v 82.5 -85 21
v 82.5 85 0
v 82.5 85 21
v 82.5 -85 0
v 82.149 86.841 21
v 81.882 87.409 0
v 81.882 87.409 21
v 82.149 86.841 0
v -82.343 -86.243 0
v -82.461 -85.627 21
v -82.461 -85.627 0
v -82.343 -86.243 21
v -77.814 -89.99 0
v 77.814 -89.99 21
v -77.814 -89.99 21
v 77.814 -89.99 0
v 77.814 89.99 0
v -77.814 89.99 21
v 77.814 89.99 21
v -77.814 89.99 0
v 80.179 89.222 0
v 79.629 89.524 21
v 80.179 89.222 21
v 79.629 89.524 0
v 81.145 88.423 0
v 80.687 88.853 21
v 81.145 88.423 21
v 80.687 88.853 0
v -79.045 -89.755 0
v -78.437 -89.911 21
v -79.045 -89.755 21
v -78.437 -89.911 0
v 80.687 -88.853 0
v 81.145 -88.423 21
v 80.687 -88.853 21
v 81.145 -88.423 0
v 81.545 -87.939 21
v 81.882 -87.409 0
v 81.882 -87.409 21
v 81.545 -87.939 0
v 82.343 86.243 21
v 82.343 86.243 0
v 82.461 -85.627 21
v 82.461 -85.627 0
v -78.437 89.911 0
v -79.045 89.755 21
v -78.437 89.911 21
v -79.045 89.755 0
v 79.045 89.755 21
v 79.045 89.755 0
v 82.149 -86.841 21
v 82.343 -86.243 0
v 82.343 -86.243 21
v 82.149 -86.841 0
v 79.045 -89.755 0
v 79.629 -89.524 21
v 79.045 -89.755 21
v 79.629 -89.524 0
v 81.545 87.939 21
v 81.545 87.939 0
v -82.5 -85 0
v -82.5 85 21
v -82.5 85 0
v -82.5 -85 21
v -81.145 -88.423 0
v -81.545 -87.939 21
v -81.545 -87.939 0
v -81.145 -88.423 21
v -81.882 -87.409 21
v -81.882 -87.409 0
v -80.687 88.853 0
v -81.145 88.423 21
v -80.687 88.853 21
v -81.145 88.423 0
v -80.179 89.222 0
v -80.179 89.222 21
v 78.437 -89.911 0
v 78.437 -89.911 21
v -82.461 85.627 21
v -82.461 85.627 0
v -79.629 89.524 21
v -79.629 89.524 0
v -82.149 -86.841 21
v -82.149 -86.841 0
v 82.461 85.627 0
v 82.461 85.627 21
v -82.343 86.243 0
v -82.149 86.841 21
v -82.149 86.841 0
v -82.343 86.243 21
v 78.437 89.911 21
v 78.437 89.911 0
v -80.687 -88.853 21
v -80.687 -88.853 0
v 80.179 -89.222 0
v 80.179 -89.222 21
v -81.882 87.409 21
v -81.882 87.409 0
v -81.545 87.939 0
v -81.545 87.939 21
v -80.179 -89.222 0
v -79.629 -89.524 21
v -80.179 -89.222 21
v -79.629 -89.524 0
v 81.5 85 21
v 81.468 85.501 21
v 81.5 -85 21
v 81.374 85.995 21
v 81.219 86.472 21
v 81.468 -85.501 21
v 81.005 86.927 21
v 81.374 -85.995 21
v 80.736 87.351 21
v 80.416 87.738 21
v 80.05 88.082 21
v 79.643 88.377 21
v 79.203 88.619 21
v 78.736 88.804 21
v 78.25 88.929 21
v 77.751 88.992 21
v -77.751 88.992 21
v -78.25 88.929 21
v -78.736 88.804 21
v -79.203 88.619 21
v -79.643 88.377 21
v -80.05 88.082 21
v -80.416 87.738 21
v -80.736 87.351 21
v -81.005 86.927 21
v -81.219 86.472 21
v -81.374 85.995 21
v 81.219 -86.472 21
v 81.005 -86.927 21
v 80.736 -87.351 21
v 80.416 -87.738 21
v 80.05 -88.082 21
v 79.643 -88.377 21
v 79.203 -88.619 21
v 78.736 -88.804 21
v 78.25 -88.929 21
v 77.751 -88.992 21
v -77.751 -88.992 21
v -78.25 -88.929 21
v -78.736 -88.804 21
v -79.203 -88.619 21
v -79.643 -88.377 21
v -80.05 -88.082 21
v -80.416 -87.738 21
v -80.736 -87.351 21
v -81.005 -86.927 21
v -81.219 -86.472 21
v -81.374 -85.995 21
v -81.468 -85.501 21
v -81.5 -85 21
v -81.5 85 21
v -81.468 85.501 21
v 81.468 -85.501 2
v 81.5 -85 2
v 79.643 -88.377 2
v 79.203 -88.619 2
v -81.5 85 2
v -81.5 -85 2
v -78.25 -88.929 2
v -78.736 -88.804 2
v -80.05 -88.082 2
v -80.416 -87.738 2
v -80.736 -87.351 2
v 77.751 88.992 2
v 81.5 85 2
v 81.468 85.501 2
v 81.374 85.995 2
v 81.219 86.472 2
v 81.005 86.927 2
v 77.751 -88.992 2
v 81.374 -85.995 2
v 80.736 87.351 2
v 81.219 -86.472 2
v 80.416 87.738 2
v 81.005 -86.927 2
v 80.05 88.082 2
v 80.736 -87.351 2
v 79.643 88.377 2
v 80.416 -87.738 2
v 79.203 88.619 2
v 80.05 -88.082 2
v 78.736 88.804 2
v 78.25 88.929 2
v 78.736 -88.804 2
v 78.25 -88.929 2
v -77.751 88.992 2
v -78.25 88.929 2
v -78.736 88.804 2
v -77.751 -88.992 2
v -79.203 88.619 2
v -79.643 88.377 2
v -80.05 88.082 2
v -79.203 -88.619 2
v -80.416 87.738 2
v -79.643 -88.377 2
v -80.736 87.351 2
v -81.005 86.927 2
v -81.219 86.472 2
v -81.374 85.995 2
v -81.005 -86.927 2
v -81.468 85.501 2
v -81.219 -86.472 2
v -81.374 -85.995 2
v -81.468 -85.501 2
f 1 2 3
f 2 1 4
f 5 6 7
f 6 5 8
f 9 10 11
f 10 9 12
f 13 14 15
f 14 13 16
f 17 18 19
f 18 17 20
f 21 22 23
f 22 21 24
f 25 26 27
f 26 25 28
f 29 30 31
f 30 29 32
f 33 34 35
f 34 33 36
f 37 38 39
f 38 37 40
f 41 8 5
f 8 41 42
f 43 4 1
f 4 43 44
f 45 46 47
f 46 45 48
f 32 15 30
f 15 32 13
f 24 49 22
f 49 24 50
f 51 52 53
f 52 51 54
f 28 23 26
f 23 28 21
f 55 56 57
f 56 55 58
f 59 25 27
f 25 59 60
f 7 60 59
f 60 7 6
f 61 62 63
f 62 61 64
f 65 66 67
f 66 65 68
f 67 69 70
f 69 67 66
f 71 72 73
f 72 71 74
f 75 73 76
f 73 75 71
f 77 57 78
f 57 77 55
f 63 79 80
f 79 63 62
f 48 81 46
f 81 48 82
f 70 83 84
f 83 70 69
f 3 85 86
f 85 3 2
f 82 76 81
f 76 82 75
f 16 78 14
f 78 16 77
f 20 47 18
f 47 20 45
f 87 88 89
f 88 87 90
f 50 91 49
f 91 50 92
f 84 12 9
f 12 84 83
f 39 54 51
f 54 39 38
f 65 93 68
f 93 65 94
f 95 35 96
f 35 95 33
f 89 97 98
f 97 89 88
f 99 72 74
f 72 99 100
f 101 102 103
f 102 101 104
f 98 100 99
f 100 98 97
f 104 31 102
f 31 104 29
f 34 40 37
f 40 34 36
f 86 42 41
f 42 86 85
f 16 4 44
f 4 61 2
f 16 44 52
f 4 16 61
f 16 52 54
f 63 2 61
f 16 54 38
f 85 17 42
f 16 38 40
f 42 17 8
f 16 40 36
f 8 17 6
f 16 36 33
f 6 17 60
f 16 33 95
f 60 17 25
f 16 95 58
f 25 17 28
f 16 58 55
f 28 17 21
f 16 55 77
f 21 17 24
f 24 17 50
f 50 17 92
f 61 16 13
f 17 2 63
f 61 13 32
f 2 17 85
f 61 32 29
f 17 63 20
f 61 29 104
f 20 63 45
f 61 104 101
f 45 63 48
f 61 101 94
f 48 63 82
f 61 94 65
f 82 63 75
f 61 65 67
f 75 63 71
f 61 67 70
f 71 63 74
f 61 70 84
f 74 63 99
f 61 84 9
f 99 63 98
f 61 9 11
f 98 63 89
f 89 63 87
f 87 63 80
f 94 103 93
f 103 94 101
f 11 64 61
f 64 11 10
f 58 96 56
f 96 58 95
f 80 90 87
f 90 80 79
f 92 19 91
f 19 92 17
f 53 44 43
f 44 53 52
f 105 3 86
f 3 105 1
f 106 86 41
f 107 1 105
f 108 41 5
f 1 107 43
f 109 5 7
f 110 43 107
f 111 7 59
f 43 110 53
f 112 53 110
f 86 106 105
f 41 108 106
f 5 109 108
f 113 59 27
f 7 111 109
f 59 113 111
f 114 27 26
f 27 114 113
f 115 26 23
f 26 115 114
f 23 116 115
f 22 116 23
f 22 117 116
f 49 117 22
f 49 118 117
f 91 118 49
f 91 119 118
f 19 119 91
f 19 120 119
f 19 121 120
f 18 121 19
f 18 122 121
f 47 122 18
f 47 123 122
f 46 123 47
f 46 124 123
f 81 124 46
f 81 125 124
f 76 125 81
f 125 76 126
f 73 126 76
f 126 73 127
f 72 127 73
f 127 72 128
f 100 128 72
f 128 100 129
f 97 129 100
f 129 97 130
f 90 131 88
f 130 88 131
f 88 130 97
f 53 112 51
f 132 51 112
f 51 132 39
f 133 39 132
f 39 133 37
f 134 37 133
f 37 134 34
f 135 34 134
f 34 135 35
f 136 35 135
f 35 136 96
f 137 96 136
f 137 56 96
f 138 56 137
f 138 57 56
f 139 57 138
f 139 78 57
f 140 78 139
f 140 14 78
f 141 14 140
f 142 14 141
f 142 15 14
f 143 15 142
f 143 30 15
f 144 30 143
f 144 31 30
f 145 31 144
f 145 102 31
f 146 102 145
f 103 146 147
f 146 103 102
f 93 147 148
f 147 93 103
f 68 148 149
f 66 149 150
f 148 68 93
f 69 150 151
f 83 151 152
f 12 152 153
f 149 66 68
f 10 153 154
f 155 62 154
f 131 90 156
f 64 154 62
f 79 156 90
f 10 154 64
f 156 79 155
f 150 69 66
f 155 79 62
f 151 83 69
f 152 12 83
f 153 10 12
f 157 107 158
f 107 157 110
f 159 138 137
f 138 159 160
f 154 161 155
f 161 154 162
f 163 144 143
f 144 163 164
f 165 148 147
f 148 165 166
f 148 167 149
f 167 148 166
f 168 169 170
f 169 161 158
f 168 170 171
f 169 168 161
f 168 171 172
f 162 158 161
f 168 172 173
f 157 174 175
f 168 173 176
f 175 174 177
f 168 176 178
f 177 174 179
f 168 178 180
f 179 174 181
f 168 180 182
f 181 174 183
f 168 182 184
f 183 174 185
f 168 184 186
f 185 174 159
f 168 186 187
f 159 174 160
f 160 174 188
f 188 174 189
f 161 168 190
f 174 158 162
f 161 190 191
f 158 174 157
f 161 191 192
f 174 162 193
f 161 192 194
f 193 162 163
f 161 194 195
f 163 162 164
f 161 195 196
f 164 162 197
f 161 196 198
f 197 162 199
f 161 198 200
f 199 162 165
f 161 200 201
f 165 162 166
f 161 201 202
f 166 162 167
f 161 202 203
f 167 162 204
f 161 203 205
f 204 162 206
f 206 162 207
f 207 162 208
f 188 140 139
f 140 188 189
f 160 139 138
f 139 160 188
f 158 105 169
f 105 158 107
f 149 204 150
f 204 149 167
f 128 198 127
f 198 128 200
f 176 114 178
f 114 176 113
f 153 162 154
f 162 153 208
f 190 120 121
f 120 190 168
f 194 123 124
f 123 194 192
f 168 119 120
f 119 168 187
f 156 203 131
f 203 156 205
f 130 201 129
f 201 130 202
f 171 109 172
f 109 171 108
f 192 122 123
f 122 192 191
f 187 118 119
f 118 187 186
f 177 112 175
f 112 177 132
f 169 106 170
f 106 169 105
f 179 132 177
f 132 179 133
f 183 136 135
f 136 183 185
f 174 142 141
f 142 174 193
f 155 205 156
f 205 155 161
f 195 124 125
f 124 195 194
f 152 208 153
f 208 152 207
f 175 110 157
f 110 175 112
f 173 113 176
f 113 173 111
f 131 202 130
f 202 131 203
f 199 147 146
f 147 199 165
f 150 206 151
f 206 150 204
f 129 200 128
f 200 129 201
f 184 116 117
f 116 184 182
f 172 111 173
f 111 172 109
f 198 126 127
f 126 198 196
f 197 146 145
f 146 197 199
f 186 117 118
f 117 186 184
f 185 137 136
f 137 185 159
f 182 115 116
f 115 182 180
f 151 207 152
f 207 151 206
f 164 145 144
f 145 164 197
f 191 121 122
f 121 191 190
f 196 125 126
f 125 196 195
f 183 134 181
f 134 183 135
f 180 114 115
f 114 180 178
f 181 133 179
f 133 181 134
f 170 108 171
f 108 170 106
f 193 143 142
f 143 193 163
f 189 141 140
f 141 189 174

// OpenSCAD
$fn = 50;


difference() {
	union() {
		hull() {
			translate(v = [-77.5000000000, 85.0000000000, 0]) {
				cylinder(h = 21, r = 5);
			}
			translate(v = [77.5000000000, 85.0000000000, 0]) {
				cylinder(h = 21, r = 5);
			}
			translate(v = [-77.5000000000, -85.0000000000, 0]) {
				cylinder(h = 21, r = 5);
			}
			translate(v = [77.5000000000, -85.0000000000, 0]) {
				cylinder(h = 21, r = 5);
			}
		}
	}
	union() {
		translate(v = [0, 0, 2]) {
			hull() {
				translate(v = [-77.5000000000, 85.0000000000, 0]) {
					cylinder(h = 19, r = 4);
				}
				translate(v = [77.5000000000, 85.0000000000, 0]) {
					cylinder(h = 19, r = 4);
				}
				translate(v = [-77.5000000000, -85.0000000000, 0]) {
					cylinder(h = 19, r = 4);
				}
				translate(v = [77.5000000000, -85.0000000000, 0]) {
					cylinder(h = 19, r = 4);
				}
			}
		}
	}
}
